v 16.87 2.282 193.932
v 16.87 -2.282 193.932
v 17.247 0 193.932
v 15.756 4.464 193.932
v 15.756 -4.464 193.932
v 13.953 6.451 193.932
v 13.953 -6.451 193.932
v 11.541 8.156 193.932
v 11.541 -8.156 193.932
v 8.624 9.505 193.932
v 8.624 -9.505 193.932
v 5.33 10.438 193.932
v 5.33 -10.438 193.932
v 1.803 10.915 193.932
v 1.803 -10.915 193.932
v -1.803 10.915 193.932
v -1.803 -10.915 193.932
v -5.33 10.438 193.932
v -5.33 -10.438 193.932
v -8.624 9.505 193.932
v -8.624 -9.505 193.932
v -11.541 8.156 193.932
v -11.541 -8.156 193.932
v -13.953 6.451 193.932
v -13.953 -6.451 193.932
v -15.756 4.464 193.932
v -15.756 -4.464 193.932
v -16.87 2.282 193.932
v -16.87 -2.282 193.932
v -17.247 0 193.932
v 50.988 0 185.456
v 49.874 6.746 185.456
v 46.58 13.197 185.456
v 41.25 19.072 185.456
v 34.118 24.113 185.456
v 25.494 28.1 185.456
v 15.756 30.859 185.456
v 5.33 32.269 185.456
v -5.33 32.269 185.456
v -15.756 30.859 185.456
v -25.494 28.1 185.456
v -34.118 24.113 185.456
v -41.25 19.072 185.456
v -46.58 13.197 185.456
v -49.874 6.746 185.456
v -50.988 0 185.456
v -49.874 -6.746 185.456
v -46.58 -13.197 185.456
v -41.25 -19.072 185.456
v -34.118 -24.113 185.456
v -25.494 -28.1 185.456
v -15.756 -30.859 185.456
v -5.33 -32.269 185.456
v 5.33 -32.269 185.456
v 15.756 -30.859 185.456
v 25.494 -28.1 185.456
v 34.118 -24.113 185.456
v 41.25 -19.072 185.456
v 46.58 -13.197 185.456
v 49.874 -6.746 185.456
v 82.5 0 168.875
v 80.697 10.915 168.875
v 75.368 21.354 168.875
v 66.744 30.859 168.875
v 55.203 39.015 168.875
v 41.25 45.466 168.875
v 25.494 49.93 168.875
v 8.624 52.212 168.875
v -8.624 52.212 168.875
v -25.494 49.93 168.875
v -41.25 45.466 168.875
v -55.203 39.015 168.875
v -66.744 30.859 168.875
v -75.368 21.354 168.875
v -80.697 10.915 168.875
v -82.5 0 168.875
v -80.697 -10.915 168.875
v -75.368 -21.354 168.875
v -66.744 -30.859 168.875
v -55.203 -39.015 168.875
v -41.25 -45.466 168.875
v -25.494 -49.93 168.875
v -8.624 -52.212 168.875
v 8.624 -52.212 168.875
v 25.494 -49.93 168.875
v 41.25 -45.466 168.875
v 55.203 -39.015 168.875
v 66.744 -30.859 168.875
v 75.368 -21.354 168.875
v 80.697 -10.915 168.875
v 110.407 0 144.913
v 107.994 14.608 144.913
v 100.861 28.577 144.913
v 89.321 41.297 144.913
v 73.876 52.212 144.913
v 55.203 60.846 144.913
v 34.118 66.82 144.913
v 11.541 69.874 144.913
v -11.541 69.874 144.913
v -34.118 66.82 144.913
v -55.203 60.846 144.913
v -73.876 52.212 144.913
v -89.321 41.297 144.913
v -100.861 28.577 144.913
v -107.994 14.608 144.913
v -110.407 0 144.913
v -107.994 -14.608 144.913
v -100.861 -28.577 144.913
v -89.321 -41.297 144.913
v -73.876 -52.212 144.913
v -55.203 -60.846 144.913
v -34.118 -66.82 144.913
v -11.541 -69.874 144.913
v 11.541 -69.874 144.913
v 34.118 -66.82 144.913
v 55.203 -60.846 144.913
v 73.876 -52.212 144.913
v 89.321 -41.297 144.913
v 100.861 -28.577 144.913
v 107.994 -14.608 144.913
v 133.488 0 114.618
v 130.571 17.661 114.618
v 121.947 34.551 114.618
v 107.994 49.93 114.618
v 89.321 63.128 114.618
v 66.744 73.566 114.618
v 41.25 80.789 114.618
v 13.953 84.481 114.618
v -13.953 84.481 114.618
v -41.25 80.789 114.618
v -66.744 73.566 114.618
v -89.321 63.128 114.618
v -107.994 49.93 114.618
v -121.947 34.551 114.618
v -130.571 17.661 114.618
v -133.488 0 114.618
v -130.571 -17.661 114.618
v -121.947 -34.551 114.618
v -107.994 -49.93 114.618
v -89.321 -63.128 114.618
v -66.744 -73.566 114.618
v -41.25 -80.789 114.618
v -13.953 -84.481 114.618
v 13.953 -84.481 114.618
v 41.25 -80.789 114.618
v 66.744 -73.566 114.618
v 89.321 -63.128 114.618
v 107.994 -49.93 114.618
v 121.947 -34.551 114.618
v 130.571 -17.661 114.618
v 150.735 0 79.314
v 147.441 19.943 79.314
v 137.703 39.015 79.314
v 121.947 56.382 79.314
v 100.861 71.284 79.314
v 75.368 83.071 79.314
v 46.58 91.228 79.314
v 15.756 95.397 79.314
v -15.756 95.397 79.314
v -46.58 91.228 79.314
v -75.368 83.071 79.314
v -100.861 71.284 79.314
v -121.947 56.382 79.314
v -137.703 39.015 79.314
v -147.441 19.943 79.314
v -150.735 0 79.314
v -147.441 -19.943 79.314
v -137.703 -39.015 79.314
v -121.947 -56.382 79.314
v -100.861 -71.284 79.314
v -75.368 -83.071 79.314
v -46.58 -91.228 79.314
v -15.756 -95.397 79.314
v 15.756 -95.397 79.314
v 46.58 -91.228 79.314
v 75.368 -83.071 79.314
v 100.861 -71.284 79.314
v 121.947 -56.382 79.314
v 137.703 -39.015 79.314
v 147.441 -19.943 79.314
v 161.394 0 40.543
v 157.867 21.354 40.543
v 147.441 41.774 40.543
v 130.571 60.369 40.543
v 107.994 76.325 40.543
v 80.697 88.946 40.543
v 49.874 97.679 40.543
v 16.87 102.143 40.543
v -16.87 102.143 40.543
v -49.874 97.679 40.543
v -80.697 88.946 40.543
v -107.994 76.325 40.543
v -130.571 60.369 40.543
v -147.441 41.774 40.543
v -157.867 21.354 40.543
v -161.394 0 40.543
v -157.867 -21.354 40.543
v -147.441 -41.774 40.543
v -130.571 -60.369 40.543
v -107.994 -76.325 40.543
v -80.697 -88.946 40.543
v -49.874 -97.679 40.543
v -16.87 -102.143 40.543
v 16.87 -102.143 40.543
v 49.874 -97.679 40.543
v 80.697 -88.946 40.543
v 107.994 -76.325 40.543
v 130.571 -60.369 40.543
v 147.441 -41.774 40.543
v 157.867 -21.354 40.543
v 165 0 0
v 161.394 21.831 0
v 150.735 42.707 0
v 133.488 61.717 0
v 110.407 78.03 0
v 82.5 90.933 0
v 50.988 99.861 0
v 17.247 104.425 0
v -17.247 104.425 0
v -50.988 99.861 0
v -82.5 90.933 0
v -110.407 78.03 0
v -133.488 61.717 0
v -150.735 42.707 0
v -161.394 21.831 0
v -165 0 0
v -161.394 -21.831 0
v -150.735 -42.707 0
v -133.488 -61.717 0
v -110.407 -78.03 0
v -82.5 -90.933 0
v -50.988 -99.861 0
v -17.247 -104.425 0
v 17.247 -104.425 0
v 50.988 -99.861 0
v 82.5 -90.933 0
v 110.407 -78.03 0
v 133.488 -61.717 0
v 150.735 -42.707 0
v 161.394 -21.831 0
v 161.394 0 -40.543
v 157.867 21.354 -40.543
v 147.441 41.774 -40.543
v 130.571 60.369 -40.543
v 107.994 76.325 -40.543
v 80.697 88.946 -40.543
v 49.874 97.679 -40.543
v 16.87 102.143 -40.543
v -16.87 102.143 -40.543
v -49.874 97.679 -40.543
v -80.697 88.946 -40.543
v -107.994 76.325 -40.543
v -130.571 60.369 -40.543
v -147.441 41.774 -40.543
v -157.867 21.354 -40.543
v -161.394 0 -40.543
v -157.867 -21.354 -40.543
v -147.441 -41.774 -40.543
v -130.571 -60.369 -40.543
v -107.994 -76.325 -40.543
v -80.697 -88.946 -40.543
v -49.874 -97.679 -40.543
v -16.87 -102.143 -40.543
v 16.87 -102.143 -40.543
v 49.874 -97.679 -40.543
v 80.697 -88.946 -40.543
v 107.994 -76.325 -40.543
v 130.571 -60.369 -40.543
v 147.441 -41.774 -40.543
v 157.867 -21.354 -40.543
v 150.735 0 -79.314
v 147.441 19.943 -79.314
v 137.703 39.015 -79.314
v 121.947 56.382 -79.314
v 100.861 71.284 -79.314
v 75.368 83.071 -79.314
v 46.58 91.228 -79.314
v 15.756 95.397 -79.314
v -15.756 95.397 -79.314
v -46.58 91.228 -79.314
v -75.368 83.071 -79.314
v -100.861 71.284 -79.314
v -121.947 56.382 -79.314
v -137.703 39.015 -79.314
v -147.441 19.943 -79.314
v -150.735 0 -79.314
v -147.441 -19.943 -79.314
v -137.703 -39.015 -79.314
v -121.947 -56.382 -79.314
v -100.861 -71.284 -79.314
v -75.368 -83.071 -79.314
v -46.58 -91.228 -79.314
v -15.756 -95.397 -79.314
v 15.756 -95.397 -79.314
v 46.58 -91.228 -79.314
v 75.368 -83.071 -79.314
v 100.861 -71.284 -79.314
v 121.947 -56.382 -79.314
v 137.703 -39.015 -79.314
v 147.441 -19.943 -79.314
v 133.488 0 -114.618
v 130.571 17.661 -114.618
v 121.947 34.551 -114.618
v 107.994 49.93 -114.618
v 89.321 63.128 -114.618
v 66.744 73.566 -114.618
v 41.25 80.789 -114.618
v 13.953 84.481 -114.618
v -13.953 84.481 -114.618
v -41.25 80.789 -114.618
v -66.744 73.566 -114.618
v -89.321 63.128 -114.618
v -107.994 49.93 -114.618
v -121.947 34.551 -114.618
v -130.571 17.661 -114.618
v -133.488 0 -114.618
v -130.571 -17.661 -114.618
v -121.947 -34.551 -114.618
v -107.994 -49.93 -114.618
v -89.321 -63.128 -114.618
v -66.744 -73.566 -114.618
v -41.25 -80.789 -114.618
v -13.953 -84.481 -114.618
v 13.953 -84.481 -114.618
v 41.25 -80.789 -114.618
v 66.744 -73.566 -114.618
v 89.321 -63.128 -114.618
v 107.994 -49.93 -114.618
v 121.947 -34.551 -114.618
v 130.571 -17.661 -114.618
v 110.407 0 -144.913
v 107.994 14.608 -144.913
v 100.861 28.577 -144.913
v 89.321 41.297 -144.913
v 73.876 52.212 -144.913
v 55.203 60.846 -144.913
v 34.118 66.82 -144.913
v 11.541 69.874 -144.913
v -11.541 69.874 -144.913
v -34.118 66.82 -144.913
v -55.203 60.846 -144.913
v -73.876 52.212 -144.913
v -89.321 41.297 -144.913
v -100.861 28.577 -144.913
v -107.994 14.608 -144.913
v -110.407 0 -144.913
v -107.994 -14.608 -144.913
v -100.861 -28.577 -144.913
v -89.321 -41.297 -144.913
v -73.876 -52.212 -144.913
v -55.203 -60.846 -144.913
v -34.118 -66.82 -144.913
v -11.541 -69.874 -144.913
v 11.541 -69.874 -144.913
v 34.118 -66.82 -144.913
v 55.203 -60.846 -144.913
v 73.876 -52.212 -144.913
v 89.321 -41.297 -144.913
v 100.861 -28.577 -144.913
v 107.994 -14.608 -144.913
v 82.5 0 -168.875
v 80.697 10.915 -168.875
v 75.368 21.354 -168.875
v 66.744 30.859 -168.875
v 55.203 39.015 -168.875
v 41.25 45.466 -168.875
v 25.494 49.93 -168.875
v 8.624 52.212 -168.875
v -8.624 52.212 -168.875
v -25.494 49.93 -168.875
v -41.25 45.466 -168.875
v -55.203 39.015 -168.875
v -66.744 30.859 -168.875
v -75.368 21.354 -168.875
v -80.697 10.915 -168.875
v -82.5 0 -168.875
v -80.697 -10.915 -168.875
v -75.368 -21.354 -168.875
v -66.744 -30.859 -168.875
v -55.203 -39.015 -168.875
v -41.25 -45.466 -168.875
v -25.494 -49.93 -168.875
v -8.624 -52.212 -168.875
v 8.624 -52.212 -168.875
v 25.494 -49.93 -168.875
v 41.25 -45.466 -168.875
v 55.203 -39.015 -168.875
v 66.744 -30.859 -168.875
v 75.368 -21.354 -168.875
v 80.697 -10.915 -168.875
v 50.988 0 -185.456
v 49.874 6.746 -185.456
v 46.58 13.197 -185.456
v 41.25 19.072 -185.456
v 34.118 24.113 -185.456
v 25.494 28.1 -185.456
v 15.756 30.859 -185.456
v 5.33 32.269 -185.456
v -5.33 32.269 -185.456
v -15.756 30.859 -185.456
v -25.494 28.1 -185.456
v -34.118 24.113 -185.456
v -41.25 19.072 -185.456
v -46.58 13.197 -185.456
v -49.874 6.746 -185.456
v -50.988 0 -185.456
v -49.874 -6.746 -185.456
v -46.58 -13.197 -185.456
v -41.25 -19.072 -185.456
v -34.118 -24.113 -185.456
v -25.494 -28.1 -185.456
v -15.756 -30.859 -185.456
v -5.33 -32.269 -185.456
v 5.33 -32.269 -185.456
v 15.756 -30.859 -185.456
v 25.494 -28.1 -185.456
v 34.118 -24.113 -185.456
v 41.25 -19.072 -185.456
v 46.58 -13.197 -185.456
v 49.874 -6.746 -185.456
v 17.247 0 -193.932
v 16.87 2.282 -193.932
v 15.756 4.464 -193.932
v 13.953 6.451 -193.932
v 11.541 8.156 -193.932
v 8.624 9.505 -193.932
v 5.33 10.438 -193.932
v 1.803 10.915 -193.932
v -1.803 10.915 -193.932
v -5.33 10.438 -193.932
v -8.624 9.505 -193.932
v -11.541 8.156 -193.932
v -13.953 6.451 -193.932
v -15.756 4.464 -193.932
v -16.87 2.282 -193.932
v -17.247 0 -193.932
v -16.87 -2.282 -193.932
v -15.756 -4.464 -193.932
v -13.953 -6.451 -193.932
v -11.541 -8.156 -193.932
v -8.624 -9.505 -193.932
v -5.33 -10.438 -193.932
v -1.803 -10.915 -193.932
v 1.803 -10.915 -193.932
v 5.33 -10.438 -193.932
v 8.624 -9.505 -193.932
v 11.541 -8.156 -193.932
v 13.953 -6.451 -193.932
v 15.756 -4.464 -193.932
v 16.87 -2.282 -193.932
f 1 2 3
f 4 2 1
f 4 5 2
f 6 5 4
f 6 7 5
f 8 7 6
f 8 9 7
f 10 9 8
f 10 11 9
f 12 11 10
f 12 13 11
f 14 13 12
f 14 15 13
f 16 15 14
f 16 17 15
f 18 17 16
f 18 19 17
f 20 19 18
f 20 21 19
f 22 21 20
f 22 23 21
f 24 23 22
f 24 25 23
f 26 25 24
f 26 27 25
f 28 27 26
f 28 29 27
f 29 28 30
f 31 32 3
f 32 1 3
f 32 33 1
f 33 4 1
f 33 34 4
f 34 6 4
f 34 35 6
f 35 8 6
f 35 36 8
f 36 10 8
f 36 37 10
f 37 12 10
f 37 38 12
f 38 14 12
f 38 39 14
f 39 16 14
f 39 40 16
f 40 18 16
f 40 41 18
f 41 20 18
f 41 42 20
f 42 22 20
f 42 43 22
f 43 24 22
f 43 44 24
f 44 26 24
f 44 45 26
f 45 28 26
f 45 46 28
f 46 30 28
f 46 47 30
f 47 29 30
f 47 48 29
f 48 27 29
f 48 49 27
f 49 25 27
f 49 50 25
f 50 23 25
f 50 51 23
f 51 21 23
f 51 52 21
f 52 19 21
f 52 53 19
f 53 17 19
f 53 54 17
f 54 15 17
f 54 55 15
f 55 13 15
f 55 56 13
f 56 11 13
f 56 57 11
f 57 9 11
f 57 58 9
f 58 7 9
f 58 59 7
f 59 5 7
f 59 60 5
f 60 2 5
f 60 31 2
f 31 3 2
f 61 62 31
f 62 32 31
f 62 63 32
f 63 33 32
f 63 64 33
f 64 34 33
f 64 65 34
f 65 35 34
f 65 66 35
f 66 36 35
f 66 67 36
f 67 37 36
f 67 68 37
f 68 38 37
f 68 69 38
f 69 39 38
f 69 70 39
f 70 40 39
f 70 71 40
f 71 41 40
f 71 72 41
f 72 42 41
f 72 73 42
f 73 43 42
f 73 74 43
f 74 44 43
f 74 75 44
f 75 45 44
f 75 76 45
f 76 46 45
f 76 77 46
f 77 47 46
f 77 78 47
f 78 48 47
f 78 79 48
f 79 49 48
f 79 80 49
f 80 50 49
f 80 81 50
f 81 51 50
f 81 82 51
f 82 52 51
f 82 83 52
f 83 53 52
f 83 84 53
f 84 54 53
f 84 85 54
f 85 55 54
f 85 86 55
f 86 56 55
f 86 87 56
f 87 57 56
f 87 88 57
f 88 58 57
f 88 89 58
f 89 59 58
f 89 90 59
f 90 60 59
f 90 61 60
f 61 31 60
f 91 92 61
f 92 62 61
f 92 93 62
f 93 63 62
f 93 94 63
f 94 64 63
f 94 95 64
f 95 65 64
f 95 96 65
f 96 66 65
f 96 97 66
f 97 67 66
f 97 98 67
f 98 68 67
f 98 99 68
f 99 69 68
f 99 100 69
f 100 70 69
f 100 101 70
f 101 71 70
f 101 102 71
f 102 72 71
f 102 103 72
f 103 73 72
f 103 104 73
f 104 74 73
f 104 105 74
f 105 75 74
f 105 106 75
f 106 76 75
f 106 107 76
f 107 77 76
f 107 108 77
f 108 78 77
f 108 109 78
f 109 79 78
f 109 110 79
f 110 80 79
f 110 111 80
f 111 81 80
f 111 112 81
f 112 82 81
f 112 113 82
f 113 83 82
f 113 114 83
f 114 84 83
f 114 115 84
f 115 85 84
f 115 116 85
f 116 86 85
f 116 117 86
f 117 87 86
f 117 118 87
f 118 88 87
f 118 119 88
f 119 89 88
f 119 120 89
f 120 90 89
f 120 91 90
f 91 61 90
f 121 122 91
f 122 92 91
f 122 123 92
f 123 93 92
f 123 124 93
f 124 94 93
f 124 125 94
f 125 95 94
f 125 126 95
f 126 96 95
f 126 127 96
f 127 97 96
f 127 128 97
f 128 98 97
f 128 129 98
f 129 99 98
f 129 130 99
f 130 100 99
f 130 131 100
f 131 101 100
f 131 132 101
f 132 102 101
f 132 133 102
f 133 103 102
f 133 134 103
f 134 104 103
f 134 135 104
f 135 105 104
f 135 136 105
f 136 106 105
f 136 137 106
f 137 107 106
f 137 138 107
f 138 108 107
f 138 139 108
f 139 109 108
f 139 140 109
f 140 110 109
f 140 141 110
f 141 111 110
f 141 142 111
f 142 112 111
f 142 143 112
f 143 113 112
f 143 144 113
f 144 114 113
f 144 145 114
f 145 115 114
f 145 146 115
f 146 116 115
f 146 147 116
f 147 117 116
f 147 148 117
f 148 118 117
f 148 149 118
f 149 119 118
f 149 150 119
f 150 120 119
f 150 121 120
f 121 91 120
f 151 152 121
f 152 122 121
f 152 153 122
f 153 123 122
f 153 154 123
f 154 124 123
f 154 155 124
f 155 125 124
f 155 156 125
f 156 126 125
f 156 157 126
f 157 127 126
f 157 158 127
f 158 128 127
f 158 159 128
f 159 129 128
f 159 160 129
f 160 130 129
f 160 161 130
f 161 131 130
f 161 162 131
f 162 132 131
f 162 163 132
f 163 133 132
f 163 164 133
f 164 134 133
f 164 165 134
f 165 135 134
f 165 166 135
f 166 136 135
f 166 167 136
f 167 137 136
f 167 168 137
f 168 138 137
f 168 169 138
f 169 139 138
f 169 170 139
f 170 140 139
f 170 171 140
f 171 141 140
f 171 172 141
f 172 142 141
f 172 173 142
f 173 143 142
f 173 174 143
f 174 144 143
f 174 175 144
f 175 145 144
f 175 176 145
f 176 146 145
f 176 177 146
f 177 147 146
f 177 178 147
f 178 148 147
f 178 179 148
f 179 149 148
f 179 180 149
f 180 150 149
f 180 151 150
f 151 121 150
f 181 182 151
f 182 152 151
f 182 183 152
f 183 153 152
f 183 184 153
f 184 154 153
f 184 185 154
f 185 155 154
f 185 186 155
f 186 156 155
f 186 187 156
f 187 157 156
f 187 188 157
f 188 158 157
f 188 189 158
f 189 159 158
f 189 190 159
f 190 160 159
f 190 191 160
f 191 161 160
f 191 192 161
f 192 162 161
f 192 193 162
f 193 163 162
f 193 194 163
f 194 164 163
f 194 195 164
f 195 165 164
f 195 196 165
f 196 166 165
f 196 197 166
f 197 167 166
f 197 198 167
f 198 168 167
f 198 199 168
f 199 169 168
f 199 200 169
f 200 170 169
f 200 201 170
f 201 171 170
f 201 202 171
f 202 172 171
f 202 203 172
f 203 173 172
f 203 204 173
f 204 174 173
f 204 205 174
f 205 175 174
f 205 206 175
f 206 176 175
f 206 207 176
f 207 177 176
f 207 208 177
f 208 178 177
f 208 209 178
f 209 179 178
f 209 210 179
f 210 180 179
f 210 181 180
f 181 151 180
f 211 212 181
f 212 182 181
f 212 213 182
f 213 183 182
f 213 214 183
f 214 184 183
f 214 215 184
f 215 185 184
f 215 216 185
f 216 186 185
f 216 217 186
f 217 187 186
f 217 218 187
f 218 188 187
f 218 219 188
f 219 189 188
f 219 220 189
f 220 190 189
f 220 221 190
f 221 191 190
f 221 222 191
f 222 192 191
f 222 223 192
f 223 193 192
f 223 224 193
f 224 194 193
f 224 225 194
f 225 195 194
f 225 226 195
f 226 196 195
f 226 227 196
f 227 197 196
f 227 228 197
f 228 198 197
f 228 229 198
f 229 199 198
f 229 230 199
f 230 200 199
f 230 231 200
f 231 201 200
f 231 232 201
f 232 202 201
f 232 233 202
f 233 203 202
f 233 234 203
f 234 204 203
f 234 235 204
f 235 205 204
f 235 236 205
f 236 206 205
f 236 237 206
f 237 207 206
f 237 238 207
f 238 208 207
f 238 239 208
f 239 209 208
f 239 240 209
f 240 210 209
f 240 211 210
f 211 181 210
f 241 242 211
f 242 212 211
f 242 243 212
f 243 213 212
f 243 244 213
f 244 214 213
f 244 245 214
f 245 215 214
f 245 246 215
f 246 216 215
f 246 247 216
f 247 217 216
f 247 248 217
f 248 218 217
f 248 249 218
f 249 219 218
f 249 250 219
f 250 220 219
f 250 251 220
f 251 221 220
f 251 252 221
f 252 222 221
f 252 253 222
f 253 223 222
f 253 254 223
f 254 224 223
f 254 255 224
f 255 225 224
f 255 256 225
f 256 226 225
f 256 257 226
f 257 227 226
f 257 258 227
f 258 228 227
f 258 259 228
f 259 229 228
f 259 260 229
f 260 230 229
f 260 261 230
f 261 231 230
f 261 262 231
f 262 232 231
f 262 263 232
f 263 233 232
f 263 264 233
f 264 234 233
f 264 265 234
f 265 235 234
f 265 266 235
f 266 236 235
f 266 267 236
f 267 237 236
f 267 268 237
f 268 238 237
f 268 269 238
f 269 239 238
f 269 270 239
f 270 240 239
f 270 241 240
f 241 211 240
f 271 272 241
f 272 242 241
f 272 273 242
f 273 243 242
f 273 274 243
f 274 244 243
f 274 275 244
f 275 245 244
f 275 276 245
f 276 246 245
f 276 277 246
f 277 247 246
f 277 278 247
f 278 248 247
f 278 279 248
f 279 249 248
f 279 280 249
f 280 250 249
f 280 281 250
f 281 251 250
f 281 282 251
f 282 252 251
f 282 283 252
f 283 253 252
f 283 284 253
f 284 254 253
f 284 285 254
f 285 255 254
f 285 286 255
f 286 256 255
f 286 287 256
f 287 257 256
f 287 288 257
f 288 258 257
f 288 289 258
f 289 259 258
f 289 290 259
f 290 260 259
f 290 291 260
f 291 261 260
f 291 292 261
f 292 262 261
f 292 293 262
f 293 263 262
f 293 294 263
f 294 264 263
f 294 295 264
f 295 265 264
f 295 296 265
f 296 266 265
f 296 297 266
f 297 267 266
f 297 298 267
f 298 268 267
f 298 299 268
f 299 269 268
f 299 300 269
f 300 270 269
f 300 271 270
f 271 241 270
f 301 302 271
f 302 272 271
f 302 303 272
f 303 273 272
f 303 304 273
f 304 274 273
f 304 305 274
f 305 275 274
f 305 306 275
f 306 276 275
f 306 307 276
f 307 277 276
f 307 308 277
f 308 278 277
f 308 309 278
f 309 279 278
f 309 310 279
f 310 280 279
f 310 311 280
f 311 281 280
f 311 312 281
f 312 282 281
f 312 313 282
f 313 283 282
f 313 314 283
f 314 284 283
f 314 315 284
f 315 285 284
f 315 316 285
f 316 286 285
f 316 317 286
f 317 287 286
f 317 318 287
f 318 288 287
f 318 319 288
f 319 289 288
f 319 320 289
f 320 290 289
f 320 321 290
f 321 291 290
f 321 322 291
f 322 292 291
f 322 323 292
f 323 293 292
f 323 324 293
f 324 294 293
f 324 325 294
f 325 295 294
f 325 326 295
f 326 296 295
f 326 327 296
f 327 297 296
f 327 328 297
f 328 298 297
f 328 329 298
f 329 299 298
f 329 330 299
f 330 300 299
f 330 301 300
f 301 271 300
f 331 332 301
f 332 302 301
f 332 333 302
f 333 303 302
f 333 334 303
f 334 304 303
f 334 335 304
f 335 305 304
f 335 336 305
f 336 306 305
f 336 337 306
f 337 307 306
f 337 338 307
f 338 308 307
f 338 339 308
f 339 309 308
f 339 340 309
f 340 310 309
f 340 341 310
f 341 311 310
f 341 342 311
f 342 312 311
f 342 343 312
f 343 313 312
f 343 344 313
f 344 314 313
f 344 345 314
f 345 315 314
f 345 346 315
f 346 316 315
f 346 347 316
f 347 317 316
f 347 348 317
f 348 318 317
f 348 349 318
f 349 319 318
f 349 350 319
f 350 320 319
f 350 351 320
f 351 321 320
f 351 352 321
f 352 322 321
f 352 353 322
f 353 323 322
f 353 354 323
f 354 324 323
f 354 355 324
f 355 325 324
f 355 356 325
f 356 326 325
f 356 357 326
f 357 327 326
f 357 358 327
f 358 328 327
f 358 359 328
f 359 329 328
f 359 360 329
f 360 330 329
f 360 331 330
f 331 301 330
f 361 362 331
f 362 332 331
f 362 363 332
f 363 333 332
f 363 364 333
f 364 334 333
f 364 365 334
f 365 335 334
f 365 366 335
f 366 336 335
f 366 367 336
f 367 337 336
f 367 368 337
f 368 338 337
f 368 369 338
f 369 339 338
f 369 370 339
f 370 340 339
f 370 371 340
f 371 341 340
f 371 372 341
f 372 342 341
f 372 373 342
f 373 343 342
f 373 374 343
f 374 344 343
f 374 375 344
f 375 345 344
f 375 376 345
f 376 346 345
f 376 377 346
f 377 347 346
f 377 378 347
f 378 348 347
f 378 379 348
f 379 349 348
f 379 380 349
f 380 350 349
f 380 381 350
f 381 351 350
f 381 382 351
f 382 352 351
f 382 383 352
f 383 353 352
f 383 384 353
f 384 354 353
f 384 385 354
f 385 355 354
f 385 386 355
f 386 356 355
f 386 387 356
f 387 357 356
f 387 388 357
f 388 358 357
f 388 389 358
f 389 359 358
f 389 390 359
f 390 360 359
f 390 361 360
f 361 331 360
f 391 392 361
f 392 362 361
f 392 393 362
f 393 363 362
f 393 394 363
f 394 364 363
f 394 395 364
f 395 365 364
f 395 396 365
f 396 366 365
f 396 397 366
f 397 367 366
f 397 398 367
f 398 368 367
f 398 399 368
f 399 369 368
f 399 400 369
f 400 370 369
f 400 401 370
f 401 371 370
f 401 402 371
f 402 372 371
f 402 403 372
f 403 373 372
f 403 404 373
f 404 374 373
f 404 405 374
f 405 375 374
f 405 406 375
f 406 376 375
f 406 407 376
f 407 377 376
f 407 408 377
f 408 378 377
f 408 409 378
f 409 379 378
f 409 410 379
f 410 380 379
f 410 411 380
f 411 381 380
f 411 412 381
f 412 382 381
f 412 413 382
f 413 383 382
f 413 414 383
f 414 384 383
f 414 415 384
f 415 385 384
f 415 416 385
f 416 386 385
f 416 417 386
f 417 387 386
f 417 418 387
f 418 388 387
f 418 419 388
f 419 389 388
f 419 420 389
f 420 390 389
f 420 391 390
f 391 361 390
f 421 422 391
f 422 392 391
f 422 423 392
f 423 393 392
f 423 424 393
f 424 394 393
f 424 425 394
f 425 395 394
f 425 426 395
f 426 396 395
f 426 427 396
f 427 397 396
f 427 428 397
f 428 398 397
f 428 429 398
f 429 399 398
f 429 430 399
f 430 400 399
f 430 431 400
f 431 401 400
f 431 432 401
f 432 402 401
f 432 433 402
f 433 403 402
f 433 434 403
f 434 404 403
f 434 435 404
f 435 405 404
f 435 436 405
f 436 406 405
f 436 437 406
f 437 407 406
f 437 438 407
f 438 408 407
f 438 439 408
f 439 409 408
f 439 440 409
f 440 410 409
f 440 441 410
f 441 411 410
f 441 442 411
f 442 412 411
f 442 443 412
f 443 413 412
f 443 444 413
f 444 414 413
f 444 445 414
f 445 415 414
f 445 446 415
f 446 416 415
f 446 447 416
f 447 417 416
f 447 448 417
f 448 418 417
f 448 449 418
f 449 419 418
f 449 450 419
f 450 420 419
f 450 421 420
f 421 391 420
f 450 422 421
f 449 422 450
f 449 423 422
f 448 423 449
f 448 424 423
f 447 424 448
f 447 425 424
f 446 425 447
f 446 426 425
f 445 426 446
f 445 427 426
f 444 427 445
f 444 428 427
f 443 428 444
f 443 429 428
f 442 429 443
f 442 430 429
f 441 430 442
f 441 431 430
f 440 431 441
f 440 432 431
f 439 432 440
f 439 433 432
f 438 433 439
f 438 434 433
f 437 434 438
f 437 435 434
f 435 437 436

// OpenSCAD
// Generated by SolidPython 1.0.1 on 2020-07-29 00:46:49


scale(v = [11, 7, 13]) {
	sphere(r = 15);
}
/***********************************************
*********      SolidPython code:      **********
************************************************
 
# import packages: SolidPython
from solid import *
from solid.utils import *
from itertools import chain, combinations, permutations


class Resize:

    def __init__(self, scad_file):
        self.scad_file = scad_file
        #self.scad_file = import_scad(scad_file)
        # cone/cylinder param:
        self.r1 = 0
        self.r2 = 0
        self.h = 0
        # rectangular prism param:
        self.w = 0
        self.l = 0
        # ellipse param:
        self.r = 0

    # import OpenScad code (file name corresponds to shape)


    # classify shape + parameters
    def assign(self, param1, param2, param3):
        if self.scad_file == 'cone.scad':
            self.r1 = param1
            self.r2 = param2
            self.h = param3
        elif self.scad_file == 'cylinder.scad':
            self.r1 = param1
            self.r2 = param2
            self.h = param3
        elif self.scad_file == 'rectangularPrism.scad':
            self.h = param1
            self.l = param2
            self.w = param3
        else:
            self.r = param1
            self.h = param2

    # resize parameters
    def iterate(self):
        x = range(3, 20, 2)
        i = 1
        if self.scad_file == 'cone.scad':
            tempList = list(permutations(x, 2))
            for temp in tempList:
                param1 = temp[0]
                param2 = temp[1]
                filepath = 'produced_scad_files/' + 'cone' + str(param1) + '_' + str(param2) + '_' + '.scad'
                scad_render_to_file(cylinder(h=param1, r1=param2, r2=0), filepath)

        elif self.scad_file == 'cylinder.scad':
            tempList = list(permutations(x, 3))
            for temp in tempList:
                param1 = temp[0]
                param2 = temp[1]
                filepath = 'produced_scad_files/' + 'cylinder' + str(param1) + '_' + str(param2) + '_' + '.scad'
                scad_render_to_file(cylinder(h=param1, r1=param2, r2=param2), filepath)

        elif self.scad_file == 'rectangularPrism.scad':
            tempList = list(permutations(x, 3))
            for temp in tempList:
                param1 = temp[0]
                param2 = temp[1]
                param3 = temp[2]
                filepath = 'produced_scad_files/' + 'rectangularPrism' + str(param1) + '_' + str(param2) + '_' + str(
                    param3) + '.scad'
                scad_render_to_file(cube(size=(param1, param2, param3)), filepath)

        elif self.scad_file == 'ellipse.scad':
            tempList = list(permutations(x, 4))
            for temp in tempList:
                param1 = temp[0]
                param2 = temp[1]
                param3 = temp[2]
                param4 = temp[3]
                filepath = 'produced_scad_files/' + 'ellipse' + str(param1) + '_' + str(param2) + '_' + str(param3) + '_' + str(param4) + '.scad'
                scad_render_to_file(scale([param1, param2, param3])(sphere(r=param4)), filepath)

    def render_to_scadfile(self):
        scad_render_to_file(scad, 'example.scad') 
 
************************************************/
